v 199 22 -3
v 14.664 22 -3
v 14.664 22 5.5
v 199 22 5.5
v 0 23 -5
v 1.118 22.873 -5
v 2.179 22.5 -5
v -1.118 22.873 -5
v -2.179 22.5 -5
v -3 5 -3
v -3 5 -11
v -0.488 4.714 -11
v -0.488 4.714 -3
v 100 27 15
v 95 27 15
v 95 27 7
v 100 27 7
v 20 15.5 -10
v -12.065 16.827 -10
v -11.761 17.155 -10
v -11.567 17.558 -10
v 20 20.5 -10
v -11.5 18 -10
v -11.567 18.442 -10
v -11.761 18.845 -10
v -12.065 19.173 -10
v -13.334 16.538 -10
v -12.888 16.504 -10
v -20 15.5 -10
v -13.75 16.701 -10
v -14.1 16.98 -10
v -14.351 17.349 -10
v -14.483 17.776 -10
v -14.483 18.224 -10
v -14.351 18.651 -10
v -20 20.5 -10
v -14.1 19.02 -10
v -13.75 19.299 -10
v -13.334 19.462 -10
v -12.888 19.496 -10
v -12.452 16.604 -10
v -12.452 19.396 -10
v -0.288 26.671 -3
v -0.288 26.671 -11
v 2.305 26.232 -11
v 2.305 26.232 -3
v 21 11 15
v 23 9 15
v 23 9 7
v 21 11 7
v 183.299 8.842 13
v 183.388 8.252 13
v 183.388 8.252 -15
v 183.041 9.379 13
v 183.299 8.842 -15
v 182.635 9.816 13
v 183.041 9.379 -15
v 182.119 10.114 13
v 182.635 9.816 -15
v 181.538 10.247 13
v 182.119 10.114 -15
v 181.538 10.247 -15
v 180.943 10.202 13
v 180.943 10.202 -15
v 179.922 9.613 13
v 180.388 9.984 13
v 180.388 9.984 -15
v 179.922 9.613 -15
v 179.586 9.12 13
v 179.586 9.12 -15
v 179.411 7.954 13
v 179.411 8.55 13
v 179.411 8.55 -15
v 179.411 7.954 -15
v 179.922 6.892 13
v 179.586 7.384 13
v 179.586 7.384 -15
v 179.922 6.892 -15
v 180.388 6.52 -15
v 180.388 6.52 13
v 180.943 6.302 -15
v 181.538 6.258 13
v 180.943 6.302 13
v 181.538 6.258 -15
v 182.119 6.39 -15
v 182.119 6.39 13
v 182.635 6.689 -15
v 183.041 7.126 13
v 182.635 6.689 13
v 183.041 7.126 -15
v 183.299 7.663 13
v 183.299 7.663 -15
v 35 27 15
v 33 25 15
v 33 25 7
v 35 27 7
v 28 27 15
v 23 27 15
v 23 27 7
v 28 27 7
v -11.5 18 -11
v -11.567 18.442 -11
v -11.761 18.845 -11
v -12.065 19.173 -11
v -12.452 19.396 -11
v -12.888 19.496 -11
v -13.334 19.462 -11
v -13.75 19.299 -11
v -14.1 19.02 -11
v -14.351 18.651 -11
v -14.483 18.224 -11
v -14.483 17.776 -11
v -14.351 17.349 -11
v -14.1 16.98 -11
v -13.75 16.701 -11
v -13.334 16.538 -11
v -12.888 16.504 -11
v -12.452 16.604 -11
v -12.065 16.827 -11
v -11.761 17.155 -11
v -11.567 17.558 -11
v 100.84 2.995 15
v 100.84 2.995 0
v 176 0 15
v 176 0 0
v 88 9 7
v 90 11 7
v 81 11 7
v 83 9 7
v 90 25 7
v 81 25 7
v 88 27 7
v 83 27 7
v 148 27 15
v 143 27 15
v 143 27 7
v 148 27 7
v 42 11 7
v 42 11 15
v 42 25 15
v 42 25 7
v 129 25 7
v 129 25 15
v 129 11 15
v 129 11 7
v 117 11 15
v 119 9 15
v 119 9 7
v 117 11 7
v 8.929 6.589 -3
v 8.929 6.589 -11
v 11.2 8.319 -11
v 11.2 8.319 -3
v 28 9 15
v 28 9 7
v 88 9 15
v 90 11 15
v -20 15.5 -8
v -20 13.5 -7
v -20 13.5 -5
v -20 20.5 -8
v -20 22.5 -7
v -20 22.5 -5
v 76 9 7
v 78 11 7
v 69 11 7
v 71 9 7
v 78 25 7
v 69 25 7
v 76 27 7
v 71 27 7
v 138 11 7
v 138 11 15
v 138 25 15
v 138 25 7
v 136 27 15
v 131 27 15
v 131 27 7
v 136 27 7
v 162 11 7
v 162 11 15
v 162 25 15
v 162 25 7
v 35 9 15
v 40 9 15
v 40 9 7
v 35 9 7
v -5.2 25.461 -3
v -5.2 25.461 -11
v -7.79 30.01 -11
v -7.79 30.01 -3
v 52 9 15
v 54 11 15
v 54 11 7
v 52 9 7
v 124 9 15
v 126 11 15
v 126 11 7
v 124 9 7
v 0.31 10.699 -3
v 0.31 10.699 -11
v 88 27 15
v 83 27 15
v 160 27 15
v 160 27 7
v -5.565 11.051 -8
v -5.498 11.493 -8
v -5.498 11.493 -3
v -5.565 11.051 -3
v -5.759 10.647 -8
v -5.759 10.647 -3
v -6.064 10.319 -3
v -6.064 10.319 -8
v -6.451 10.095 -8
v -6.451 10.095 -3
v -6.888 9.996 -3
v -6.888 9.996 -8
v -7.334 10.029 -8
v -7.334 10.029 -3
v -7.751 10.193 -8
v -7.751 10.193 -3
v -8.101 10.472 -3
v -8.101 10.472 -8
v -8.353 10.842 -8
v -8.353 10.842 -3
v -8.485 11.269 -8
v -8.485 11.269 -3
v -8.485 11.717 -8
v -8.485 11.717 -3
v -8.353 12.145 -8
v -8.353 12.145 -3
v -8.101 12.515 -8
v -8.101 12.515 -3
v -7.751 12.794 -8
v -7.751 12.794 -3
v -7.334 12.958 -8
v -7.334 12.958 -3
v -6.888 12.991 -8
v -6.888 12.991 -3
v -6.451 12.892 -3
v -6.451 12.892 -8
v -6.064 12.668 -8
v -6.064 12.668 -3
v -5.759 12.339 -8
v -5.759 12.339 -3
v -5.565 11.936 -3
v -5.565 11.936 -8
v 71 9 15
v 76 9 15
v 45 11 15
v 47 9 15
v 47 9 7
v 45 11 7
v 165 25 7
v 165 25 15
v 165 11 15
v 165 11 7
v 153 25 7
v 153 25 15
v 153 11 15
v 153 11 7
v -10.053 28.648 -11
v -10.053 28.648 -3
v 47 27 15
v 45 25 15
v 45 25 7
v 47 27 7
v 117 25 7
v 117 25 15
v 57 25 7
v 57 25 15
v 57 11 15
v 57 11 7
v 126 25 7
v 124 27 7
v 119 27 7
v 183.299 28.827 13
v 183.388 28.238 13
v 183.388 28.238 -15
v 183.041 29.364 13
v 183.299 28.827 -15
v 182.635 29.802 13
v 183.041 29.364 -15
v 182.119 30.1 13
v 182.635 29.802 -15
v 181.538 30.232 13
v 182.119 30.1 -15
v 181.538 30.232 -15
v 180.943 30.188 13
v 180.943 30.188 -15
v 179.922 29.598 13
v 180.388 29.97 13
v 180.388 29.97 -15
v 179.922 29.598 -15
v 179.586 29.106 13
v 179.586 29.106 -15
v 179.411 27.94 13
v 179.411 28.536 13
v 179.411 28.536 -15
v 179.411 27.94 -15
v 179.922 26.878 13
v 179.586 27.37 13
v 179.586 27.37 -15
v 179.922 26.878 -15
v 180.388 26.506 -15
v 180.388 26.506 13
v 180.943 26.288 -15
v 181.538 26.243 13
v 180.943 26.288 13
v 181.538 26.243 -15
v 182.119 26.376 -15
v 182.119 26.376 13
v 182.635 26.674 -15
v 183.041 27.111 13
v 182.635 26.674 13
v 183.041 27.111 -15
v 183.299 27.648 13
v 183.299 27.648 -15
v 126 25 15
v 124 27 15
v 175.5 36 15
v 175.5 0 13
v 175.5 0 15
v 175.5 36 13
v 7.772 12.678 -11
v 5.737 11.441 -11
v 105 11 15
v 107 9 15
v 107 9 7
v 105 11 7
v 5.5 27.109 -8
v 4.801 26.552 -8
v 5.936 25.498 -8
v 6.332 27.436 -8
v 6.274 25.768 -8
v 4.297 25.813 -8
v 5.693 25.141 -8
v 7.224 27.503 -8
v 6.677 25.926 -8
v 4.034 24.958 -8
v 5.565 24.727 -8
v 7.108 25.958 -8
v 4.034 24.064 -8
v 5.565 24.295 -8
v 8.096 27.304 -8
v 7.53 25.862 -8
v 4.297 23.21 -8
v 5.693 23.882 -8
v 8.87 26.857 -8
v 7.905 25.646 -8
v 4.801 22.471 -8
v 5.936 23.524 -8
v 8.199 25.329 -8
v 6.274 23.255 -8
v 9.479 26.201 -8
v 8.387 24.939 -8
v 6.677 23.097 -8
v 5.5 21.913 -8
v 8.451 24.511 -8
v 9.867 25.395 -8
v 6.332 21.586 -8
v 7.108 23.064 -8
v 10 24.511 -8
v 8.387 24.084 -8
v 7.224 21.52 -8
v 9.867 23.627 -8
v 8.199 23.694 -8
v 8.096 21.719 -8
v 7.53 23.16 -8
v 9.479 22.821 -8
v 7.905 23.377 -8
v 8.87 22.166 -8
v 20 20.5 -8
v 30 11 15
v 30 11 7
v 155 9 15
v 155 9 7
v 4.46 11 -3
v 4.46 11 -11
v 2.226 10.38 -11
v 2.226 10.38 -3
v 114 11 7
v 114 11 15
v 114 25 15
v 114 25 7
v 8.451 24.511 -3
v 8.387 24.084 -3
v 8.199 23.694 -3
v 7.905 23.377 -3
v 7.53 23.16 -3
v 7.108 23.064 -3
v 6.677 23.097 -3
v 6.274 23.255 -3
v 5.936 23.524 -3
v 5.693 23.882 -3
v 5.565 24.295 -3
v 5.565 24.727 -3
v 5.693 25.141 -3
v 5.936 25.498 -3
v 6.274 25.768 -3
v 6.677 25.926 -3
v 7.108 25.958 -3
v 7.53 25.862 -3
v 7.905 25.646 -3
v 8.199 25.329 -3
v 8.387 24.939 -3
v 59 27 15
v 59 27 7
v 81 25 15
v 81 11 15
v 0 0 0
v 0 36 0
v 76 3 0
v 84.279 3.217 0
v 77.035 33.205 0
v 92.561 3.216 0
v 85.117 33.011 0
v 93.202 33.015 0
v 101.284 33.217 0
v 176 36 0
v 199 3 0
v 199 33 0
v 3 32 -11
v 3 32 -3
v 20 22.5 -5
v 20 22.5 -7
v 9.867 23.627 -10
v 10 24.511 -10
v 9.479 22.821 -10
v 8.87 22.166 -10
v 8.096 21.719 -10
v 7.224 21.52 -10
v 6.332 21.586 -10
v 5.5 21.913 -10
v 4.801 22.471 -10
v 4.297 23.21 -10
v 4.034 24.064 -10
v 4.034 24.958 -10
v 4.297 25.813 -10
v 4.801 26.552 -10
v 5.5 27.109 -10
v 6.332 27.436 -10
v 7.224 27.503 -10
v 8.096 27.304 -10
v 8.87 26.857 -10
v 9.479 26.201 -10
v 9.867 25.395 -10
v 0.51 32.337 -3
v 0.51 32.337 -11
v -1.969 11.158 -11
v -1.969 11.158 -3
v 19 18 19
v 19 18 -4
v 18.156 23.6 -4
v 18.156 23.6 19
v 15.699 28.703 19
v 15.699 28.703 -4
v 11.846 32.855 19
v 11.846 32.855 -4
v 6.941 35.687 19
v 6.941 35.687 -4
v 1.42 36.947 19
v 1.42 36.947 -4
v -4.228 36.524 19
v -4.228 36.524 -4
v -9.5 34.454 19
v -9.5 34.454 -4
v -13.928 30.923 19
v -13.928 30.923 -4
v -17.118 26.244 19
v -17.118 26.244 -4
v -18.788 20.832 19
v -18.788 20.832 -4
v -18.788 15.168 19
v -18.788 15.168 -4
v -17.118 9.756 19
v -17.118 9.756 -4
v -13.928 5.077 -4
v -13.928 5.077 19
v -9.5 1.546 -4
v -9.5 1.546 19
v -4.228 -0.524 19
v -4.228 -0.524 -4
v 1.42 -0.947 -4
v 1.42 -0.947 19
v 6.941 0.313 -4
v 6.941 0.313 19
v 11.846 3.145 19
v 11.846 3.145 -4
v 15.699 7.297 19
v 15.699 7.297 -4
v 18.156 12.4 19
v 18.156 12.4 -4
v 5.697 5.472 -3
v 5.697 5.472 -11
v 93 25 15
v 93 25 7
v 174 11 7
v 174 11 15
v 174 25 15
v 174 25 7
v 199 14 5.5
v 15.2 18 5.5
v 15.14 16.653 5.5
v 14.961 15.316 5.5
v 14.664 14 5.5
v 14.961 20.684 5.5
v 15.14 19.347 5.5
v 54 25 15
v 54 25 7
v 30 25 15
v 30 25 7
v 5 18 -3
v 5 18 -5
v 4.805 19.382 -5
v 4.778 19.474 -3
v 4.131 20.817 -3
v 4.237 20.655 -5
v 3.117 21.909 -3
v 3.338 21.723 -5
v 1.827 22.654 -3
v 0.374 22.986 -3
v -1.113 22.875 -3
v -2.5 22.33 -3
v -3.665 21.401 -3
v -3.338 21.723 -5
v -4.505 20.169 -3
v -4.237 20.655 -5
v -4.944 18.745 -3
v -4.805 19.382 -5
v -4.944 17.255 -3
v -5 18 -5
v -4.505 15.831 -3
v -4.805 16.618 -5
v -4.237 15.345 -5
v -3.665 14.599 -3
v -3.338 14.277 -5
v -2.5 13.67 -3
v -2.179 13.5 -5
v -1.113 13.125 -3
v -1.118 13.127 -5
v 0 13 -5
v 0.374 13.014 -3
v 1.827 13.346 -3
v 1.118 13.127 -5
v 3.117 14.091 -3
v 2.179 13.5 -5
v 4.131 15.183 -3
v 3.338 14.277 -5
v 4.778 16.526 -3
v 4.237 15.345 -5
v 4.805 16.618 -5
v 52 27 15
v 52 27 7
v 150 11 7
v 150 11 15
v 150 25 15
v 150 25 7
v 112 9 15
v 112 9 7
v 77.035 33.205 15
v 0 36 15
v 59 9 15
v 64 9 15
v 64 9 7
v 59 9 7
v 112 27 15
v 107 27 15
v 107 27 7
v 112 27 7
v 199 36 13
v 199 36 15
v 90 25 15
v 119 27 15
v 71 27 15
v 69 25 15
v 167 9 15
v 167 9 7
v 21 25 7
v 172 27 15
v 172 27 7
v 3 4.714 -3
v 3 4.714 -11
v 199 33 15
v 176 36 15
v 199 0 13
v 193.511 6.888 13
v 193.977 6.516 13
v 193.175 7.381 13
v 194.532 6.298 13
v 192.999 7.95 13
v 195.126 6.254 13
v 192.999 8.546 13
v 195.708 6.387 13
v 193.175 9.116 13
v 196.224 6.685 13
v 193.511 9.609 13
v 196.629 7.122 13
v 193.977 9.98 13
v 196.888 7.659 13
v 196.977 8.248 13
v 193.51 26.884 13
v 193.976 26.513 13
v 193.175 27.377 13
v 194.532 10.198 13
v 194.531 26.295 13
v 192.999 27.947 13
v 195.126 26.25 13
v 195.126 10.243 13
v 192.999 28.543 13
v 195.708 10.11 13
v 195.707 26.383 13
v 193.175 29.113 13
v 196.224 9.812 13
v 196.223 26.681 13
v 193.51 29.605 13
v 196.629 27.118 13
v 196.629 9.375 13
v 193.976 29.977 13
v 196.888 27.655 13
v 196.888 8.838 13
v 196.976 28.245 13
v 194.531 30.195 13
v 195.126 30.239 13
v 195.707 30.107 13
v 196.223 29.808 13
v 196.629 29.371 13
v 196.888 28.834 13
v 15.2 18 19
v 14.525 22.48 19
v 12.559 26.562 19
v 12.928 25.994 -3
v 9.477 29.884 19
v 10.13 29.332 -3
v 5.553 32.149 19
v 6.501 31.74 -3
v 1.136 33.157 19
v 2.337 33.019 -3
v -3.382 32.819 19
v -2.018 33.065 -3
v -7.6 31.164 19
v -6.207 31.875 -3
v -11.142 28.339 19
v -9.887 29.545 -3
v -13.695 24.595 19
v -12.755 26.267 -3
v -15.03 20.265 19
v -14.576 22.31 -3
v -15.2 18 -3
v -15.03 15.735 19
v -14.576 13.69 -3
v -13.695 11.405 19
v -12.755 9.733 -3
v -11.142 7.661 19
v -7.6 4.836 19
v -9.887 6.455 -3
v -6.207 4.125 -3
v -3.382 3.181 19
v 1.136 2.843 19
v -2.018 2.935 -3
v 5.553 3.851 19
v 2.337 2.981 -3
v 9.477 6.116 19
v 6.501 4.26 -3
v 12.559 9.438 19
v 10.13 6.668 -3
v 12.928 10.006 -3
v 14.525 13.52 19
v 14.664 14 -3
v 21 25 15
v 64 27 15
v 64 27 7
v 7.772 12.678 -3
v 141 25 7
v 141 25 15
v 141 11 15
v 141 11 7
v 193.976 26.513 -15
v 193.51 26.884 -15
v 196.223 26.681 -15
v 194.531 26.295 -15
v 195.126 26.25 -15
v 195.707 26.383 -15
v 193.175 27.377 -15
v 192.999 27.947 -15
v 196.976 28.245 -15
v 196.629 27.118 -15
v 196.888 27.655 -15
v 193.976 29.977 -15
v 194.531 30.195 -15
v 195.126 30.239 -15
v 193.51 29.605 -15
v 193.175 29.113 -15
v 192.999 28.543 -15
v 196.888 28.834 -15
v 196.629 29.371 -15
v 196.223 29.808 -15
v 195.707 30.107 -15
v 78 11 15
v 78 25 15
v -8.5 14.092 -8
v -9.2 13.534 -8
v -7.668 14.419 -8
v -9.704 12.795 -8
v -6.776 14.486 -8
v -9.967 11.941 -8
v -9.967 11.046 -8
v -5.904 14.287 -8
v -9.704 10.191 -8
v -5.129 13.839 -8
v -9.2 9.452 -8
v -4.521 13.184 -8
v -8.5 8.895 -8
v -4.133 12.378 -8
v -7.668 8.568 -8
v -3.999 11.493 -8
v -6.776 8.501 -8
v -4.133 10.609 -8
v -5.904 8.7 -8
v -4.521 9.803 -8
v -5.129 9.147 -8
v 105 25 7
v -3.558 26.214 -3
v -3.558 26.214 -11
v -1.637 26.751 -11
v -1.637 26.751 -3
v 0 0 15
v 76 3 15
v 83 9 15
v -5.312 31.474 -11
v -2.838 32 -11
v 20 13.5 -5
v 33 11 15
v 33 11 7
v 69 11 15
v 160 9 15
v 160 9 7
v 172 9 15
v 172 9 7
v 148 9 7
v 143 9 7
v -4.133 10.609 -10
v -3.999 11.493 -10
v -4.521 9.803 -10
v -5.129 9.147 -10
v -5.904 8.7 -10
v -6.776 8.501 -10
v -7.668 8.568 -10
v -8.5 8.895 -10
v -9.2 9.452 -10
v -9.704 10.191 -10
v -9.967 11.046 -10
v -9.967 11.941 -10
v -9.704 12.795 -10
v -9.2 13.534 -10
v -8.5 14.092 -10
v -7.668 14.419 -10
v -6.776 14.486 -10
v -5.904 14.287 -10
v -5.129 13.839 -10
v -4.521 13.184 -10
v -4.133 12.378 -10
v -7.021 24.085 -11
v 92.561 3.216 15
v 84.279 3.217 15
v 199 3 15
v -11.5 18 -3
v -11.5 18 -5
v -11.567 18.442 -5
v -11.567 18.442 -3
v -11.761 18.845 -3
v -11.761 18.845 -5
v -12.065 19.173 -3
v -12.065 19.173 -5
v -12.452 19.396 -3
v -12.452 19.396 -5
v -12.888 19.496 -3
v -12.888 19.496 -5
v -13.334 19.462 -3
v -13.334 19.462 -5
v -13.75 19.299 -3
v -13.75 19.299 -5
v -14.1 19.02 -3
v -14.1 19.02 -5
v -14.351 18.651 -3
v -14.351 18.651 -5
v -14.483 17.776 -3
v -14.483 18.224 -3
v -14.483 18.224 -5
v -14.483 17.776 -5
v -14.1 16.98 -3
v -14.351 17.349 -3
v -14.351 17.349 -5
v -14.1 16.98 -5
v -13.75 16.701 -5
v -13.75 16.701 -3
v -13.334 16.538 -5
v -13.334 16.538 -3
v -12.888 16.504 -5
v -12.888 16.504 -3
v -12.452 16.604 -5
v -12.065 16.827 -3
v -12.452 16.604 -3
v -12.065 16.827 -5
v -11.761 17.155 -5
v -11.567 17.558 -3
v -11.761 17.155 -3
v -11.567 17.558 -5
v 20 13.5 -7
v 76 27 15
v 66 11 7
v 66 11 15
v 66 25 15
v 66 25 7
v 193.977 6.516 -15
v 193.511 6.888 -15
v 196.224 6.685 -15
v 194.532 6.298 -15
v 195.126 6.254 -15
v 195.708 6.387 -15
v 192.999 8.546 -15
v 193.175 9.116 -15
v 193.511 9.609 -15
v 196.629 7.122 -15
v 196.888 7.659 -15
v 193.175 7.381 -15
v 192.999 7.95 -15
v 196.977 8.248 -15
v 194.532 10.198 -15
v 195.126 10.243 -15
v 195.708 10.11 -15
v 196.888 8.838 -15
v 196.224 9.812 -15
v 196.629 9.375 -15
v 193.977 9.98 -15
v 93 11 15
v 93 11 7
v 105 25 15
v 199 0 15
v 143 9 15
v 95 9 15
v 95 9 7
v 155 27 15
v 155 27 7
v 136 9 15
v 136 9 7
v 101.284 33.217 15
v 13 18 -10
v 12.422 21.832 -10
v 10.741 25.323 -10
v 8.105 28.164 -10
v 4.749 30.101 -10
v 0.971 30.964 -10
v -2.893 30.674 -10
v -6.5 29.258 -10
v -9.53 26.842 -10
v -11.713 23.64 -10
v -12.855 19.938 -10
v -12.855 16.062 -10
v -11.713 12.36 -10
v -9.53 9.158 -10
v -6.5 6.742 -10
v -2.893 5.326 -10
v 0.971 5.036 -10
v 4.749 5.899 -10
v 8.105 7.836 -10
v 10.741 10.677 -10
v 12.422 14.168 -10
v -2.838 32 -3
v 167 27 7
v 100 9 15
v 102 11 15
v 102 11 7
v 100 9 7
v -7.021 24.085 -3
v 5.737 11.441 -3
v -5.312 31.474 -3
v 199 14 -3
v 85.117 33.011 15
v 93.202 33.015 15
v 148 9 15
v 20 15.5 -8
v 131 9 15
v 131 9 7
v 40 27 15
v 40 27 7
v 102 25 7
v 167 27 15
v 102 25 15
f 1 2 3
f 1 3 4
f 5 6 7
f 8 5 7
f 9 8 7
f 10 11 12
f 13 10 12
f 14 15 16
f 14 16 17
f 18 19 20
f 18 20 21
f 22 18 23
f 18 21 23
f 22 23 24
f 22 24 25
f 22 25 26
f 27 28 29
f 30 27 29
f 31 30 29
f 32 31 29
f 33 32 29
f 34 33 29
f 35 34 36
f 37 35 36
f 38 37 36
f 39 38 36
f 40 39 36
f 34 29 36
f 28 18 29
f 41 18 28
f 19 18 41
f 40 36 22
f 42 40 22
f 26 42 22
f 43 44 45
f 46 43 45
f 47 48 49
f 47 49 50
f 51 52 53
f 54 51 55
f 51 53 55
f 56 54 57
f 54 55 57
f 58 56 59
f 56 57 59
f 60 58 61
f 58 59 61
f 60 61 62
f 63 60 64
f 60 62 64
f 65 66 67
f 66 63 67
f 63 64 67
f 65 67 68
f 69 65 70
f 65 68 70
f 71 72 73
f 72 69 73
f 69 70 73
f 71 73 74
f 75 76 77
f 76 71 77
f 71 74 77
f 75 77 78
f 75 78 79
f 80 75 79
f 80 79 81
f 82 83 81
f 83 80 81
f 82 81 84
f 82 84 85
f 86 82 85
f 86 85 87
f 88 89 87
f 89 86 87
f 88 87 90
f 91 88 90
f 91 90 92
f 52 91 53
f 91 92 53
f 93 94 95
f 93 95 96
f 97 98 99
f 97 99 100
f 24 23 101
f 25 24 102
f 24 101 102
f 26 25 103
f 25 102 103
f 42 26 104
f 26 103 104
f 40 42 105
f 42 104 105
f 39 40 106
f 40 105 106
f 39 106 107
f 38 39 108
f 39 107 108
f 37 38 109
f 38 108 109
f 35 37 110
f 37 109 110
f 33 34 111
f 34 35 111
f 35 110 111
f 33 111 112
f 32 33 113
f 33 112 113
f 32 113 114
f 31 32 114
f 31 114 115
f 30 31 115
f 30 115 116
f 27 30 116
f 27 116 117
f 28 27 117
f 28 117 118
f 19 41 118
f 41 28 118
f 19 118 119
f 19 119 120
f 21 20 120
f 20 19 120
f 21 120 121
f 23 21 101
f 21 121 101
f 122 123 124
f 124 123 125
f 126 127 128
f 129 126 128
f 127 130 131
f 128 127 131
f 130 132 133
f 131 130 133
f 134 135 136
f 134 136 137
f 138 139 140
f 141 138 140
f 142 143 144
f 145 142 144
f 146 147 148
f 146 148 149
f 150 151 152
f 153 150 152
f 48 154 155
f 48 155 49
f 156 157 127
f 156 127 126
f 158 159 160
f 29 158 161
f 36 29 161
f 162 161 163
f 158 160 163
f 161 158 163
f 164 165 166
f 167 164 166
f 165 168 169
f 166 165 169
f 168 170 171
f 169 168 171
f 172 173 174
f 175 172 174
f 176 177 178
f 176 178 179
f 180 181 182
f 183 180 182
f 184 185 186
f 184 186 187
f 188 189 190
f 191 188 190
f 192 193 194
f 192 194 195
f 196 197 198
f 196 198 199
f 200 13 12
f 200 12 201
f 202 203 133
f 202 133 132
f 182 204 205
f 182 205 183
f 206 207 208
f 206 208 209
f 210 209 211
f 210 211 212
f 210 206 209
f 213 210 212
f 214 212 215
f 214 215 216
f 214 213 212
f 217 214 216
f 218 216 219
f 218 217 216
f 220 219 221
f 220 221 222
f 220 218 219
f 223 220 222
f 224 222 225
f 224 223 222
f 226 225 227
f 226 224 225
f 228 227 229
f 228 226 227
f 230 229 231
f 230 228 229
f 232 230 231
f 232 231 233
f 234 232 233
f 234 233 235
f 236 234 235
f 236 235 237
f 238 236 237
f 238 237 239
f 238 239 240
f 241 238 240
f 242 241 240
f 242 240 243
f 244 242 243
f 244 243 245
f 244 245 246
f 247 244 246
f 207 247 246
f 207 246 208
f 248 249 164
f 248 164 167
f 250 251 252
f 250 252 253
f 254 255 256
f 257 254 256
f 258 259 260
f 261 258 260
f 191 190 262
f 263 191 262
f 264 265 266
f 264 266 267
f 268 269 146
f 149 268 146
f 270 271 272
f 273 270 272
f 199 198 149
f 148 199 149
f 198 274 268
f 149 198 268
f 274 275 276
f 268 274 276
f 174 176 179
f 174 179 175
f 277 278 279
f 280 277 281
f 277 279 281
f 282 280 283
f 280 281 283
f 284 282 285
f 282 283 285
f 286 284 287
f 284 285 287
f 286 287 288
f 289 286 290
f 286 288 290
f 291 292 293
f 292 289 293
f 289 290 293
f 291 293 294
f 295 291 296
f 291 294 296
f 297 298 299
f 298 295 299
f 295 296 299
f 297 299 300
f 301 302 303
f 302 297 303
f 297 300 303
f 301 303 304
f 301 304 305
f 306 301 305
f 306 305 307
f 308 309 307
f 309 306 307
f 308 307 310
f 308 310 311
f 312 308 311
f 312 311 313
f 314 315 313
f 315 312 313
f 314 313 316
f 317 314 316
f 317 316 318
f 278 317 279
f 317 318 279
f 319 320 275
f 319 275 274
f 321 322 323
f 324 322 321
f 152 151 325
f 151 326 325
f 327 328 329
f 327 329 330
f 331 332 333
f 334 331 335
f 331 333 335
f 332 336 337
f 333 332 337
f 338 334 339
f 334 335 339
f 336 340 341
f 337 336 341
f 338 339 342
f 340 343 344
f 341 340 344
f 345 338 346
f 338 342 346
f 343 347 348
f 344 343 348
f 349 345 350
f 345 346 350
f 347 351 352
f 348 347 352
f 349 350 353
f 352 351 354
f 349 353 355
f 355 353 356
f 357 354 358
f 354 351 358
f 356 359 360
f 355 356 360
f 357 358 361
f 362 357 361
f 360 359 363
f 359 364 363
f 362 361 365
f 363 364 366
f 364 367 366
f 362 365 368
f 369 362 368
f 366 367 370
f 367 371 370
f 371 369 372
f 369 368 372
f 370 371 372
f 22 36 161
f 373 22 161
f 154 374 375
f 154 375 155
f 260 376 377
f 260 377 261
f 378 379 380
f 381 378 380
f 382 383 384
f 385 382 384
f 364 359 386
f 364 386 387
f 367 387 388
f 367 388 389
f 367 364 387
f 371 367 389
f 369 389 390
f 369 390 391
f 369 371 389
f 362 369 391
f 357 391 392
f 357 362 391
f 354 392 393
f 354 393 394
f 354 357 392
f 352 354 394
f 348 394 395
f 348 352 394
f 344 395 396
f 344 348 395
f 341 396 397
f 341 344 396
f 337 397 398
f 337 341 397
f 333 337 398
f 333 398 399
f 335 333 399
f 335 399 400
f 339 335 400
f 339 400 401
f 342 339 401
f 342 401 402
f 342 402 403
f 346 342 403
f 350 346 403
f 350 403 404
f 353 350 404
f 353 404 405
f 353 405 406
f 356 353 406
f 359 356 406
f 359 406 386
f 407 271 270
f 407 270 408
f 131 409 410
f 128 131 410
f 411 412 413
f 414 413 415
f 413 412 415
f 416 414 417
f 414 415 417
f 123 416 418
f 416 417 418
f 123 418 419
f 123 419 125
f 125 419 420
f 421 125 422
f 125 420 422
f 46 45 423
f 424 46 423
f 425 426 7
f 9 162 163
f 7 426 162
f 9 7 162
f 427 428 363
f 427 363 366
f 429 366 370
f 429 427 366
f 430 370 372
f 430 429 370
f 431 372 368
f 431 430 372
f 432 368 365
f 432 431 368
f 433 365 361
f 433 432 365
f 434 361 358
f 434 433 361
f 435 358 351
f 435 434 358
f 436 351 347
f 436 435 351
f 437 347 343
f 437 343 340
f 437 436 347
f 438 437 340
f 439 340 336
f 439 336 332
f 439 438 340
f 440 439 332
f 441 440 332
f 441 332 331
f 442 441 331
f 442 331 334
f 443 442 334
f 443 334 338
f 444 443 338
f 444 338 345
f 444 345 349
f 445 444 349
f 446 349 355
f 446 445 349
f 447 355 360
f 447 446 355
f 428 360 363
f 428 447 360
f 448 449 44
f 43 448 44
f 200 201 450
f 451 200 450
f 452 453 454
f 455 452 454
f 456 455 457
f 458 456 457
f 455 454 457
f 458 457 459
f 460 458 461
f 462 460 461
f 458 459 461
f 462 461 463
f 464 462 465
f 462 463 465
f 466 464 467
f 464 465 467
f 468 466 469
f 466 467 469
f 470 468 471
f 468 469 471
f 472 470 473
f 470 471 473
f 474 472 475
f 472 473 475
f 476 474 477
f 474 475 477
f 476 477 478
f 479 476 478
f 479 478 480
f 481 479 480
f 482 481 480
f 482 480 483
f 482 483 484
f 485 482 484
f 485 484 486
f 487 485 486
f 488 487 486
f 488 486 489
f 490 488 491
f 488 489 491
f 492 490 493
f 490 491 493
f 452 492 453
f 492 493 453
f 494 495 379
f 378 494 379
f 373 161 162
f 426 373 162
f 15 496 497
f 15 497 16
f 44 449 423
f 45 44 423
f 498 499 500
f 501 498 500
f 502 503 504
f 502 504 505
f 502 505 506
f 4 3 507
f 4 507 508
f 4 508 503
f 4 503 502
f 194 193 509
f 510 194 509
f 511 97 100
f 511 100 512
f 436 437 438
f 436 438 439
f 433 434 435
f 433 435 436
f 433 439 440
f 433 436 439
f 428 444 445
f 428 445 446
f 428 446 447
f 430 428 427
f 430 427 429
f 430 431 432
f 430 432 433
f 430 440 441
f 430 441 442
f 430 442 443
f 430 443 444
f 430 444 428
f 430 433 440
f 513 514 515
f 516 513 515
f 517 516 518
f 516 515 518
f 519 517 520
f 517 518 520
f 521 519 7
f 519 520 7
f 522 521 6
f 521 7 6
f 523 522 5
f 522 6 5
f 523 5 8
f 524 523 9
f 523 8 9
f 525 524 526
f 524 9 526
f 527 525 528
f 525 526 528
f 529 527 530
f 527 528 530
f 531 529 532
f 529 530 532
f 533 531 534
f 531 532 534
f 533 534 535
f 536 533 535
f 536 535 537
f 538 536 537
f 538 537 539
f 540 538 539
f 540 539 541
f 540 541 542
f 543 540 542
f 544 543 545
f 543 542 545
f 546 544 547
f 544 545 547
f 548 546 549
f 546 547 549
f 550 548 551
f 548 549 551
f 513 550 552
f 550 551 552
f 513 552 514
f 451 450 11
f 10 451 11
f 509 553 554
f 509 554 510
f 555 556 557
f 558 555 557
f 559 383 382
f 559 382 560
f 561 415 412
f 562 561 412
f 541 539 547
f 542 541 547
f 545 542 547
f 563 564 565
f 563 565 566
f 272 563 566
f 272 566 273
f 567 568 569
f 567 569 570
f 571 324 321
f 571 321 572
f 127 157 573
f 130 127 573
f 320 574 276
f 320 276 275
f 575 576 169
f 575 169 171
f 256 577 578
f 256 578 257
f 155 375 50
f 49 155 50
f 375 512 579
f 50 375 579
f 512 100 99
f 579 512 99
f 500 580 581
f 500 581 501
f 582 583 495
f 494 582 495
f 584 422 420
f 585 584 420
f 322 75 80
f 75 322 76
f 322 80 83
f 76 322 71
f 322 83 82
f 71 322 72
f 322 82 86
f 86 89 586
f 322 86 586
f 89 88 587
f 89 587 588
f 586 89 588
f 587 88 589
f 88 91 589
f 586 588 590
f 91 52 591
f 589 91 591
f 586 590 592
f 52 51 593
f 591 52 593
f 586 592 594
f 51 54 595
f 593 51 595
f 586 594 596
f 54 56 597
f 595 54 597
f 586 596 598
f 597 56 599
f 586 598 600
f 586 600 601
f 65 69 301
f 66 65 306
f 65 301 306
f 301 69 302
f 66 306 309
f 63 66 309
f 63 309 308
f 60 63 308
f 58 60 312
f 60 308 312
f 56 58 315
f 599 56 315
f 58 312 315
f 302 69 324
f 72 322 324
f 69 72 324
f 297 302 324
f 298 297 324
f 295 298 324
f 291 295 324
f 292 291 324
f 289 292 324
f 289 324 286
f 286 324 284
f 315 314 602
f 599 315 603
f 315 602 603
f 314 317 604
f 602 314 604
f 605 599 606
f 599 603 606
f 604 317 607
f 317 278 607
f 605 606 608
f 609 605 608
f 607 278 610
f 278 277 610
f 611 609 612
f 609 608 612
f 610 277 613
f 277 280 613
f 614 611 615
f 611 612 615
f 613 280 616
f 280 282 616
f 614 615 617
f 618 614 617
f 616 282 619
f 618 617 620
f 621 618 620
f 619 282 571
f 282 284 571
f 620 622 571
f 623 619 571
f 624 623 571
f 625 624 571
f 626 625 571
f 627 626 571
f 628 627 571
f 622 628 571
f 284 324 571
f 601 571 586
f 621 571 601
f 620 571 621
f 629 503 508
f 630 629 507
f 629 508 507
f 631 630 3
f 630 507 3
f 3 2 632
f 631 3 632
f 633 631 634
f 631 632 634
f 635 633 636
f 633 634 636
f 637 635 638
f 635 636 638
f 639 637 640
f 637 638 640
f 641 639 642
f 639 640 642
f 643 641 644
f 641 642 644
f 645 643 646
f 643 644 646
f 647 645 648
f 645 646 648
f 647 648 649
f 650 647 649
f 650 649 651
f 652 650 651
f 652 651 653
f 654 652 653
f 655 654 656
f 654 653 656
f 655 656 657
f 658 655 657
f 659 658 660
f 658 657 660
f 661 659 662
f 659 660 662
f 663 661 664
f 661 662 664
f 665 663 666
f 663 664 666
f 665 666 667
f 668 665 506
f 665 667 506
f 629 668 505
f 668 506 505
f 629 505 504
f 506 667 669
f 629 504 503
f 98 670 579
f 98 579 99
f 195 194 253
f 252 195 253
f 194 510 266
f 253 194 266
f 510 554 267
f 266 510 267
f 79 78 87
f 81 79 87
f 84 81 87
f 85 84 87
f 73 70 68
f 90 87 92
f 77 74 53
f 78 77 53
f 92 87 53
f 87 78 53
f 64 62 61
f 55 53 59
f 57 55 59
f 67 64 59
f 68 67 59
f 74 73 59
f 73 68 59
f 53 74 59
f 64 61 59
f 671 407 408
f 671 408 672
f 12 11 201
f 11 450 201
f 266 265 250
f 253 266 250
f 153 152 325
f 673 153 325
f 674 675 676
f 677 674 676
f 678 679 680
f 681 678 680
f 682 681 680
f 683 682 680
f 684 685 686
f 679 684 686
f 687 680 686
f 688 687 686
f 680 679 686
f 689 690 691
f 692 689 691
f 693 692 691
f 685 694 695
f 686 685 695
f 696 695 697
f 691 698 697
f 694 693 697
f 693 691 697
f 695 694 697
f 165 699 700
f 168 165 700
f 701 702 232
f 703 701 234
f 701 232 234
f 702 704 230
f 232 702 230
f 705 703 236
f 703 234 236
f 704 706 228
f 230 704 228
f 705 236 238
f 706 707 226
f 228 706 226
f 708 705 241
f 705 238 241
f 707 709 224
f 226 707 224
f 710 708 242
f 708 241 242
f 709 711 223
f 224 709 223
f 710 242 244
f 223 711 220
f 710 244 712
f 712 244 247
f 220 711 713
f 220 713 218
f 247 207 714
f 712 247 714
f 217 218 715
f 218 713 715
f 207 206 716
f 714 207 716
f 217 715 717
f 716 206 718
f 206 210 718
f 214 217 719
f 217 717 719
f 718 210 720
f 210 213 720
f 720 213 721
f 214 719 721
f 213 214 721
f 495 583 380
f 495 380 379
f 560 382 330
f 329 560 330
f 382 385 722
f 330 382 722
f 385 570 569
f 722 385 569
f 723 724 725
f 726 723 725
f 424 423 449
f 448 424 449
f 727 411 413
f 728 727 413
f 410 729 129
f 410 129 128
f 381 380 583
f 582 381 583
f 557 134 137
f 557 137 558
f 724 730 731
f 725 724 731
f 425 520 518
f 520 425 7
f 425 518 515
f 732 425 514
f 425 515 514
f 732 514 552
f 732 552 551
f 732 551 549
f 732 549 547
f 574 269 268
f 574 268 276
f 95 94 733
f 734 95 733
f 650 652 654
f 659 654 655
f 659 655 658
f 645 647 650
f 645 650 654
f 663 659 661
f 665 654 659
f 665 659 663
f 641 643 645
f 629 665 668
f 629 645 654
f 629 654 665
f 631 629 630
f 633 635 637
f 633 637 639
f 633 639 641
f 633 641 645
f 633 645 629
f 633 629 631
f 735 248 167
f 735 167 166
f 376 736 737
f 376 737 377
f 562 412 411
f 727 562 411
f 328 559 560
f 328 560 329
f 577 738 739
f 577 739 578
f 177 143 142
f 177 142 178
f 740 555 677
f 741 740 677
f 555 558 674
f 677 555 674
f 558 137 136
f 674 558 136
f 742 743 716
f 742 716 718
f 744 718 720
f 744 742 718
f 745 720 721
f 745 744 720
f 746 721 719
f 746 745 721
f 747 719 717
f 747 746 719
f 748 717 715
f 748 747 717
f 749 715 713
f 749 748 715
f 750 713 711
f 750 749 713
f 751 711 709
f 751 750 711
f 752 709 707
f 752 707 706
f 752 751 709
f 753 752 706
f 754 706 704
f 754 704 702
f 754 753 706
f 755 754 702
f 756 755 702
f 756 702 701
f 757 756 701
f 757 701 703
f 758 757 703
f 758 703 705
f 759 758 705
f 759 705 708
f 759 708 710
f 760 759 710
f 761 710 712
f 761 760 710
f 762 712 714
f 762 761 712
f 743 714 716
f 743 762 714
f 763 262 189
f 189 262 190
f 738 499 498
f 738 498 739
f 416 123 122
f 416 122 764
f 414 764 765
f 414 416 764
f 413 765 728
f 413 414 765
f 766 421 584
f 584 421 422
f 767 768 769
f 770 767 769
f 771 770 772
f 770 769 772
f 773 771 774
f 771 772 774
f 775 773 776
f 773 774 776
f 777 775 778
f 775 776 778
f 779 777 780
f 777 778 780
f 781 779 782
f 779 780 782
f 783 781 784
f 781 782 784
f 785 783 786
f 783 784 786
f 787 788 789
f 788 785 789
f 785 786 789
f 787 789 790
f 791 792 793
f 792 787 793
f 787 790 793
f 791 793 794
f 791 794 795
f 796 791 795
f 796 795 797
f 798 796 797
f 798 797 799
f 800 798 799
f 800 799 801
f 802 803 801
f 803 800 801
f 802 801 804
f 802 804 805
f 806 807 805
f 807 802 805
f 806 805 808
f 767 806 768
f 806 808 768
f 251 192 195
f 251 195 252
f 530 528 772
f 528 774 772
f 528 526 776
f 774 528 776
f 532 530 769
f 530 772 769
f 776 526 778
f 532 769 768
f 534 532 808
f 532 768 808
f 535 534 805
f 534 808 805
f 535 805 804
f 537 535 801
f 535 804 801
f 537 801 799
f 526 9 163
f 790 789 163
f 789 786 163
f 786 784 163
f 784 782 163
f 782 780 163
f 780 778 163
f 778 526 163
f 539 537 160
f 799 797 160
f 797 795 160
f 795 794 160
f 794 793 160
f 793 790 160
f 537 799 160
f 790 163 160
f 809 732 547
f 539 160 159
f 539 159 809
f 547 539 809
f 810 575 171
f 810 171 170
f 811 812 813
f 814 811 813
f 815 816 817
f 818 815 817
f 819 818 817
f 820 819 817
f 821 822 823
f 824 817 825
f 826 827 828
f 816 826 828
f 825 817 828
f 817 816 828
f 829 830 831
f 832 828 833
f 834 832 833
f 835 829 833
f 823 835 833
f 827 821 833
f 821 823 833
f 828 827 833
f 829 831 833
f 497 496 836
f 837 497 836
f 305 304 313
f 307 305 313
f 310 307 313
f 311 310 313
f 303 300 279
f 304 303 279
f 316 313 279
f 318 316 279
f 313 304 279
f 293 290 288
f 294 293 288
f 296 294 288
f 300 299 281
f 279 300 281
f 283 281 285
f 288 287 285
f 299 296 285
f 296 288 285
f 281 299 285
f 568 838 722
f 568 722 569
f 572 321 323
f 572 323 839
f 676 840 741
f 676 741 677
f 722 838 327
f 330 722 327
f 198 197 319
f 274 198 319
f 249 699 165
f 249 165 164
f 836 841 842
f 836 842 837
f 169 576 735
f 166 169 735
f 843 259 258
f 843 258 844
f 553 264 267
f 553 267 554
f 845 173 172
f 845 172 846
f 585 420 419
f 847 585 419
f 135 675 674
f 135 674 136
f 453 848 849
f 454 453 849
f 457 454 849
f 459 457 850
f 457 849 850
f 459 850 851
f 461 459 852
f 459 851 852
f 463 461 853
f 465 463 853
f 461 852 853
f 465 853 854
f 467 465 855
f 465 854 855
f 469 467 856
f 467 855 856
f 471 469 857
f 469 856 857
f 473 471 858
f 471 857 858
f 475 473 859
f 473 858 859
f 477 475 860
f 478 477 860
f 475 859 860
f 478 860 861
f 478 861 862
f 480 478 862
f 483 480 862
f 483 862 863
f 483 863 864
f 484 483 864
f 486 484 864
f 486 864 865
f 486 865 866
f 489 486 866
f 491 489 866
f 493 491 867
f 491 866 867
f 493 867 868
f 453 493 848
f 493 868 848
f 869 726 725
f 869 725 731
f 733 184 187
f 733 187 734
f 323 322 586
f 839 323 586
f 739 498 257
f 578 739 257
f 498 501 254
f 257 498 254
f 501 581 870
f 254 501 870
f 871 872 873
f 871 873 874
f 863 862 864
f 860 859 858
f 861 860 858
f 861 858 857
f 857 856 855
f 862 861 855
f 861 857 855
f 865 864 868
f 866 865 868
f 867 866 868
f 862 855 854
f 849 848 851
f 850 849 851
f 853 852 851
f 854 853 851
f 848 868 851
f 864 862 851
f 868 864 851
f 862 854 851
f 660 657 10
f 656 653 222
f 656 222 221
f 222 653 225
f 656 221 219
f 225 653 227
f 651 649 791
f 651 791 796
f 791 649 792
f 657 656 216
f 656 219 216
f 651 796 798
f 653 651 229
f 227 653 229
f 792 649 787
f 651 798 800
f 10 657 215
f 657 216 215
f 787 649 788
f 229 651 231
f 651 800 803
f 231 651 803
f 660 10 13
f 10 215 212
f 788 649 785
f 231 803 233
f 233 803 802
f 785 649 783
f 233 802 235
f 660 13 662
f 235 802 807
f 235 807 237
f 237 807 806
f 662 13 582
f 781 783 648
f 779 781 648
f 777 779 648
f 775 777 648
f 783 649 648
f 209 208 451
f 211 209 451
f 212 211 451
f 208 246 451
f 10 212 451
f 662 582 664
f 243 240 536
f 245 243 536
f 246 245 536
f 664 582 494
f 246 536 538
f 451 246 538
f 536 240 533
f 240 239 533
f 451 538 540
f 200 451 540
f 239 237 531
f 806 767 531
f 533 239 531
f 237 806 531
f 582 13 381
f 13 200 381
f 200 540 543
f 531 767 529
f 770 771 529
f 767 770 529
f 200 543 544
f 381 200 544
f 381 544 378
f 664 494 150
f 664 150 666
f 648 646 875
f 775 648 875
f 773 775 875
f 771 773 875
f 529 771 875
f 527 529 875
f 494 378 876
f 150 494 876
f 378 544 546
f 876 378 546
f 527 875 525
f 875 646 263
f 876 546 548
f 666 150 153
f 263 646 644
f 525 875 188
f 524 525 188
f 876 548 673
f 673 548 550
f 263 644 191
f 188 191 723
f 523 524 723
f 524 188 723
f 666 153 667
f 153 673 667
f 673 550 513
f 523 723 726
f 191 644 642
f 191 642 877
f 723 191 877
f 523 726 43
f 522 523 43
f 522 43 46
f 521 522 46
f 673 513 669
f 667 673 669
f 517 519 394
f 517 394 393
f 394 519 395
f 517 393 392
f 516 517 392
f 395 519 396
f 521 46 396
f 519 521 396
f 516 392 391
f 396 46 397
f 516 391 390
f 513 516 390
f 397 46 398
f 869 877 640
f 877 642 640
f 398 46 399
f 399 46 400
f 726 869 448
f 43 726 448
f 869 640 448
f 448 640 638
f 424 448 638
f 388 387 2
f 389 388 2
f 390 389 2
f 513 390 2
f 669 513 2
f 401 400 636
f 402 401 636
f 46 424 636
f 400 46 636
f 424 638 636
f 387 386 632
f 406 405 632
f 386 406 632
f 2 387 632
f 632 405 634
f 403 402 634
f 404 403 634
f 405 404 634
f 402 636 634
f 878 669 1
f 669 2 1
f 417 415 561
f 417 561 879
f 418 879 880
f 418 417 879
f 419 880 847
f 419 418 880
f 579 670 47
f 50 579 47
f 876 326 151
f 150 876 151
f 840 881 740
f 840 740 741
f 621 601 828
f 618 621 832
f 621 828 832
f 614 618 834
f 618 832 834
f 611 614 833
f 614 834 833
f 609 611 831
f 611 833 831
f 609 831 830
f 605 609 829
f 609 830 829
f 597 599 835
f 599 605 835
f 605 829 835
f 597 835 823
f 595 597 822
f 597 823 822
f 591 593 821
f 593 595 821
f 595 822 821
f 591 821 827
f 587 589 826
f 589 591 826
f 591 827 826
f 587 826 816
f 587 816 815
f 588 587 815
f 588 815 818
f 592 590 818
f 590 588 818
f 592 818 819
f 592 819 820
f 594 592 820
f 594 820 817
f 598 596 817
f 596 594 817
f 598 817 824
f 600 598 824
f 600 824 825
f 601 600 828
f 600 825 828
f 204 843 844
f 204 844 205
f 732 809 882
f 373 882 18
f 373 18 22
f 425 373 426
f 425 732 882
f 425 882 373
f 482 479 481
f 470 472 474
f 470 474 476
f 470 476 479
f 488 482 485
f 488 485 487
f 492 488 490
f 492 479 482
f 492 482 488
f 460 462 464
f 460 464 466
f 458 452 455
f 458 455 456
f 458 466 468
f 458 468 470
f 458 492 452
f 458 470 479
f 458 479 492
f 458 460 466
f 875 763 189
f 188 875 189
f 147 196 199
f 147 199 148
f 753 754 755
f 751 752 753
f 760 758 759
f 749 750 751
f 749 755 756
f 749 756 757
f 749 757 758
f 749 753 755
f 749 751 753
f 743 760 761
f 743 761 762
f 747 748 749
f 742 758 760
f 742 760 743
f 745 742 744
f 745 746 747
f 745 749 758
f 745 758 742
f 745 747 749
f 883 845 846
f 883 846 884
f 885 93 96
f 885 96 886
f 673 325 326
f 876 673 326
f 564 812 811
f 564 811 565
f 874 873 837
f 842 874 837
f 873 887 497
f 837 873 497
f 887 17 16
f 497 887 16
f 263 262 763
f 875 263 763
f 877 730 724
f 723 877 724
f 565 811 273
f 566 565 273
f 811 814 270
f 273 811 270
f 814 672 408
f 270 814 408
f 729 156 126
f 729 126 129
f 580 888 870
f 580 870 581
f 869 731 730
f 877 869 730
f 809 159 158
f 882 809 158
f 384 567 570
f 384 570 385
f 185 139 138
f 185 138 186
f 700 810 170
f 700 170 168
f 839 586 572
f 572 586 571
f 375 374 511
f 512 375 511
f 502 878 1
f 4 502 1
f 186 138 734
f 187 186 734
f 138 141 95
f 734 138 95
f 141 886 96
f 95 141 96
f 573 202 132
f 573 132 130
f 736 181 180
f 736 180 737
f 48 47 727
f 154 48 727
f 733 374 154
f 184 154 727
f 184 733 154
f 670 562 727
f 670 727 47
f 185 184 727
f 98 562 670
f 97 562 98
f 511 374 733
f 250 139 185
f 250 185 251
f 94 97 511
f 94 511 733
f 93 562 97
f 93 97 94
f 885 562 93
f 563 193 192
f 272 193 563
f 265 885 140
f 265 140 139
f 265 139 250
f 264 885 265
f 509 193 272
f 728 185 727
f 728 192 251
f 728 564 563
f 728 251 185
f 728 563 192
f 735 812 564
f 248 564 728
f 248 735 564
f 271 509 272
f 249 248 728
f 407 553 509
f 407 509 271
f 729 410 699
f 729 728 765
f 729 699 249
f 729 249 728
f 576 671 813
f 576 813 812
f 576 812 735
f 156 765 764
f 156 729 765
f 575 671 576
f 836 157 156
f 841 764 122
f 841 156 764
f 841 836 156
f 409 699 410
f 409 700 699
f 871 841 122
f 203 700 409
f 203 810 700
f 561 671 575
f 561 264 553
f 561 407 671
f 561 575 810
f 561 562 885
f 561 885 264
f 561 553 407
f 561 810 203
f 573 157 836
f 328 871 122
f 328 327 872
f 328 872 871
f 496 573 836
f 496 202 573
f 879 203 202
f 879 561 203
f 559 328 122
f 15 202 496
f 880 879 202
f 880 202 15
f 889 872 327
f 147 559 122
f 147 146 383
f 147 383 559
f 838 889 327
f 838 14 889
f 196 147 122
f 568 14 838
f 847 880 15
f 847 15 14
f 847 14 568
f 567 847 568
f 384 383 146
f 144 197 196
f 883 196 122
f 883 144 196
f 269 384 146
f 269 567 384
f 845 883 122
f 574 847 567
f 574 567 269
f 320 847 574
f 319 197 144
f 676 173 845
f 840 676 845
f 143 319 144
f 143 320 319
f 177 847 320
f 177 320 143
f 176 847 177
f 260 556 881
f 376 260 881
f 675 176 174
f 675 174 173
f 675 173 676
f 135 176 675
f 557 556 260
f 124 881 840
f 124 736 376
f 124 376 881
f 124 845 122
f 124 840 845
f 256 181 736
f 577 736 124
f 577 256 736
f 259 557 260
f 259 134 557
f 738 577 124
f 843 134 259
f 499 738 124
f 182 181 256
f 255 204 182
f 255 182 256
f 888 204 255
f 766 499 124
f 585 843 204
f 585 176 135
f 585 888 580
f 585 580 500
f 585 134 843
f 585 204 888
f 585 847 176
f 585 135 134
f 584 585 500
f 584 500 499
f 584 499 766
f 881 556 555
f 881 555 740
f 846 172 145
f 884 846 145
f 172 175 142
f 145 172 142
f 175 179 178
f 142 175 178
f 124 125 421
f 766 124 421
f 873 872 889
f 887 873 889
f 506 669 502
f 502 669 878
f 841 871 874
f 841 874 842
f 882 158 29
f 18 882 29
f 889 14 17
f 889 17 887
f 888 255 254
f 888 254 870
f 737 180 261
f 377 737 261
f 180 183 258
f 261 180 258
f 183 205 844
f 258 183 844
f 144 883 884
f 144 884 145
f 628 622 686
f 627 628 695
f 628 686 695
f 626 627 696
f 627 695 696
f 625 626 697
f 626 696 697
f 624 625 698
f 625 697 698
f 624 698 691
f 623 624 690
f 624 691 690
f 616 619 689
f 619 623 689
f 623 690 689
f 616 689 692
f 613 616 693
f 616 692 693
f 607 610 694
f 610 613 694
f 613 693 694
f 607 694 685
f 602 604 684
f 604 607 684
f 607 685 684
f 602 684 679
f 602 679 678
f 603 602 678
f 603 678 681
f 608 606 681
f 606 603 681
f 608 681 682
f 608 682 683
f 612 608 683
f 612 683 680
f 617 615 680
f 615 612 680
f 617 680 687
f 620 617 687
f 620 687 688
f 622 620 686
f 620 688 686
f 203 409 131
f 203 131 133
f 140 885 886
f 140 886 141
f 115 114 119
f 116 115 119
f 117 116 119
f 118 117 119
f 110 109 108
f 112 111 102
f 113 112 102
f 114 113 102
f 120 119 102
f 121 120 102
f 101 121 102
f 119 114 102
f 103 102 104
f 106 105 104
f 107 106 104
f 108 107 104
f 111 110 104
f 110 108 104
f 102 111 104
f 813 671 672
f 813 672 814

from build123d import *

# Parameters (mm, degrees)
CYLINDER_R          = 19
CYLINDER_DEPTH      = 29
CHAMFER_SIZE        = 6
CYLINDER001_R       = 15.2
CYLINDER001_DEPTH   = 22
BOX001_W            = 23.5
BOX001_H            = 36
BOX001_DEPTH        = 2
CYLINDER002_R       = 5
CYLINDER002_DEPTH   = 10
PAD003_DEPTH        = 40
BOX002_W            = 199
BOX002_H            = 8
BOX002_DEPTH        = 8.5
SKETCH002_R         = 3.000774
SKETCH002_R_2       = 3
PAD_DEPTH           = 2
PAD002_DEPTH        = 10
SKETCH001_R         = 1.502004
SKETCH001_R_2       = 1.451029
PAD001_DEPTH        = 10
SKETCH005_R         = 2
PAD005_DEPTH        = 30
CYLINDER003_R       = 1.5
CYLINDER003_DEPTH   = 10
PAD004_DEPTH        = 15
POCKET_DEPTH        = 8
LINEARPATTERN_COUNT = 13
LINEARPATTERN_PITCH = 12


with BuildPart() as chamfer_body:
    # Cylinder → Cylinder (new body)
    with BuildSketch(Plane(origin=(0, 18, -10), x_dir=(1, 0, 0), z_dir=(0, 0, 1))):
        Circle(CYLINDER_R)
    extrude(amount=CYLINDER_DEPTH)

    # Chamfer
    chamfer_edges = [chamfer_body.edges().sort_by_distance(p)[0] for p in [
        (-19, 18, -10),
    ]]
    chamfer(chamfer_edges, length=CHAMFER_SIZE)


with BuildPart() as cylinder001:
    # Cylinder001 → Cylinder001 (new body)
    with BuildSketch(Plane(origin=(0, 18, -3), x_dir=(1, 0, 0), z_dir=(0, 0, 1))):
        Circle(CYLINDER001_R)
    extrude(amount=CYLINDER001_DEPTH)


with BuildPart() as cube001:
    # Box001 → Box001 (new body)
    with BuildSketch(Plane(origin=(175.5, 0, 13), x_dir=(1, 0, 0), z_dir=(0, 0, 1))):
        with Locations((11.75, 18)):
            Rectangle(BOX001_W, BOX001_H)
    extrude(amount=BOX001_DEPTH)


with BuildPart() as cylinder002:
    # Cylinder002 → Cylinder002 (new body)
    with BuildSketch(Plane(origin=(0, 18, -5), x_dir=(1, 0, 0), z_dir=(0, 0, 1))):
        Circle(CYLINDER002_R)
    extrude(amount=CYLINDER002_DEPTH)


with BuildPart() as pad003:
    # Sketch → Pad003 (new body)
    with BuildSketch(Plane(origin=(-20, 29.5, -6), x_dir=(0, -1, 0), z_dir=(-1, 0, 0))):
        Polygon((7, 1), (16, 1), (16, -1), (14, -2), (14, -4), (9, -4), (9, -2), (7, -1), align=None)
    extrude(amount=-PAD003_DEPTH)


with BuildPart() as cube002:
    # Box002 → Box002 (new body)
    with BuildSketch(Plane(origin=(0, 14, -3), x_dir=(1, 0, 0), z_dir=(0, 0, 1))):
        with Locations((99.5, 4)):
            Rectangle(BOX002_W, BOX002_H)
    extrude(amount=BOX002_DEPTH)


with BuildPart() as pad:
    # Sketch002 → Pad (new body)
    with BuildSketch(Plane(origin=(0, 0, -10), x_dir=(1, 0, 0), z_dir=(0, 0, -1))):
        with Locations((-7, -11.493315)):
            Circle(SKETCH002_R)
        with Locations((7, -24.511189)):
            Circle(SKETCH002_R_2)
    extrude(amount=-PAD_DEPTH)


with BuildPart() as pad002:
    # Sketch003 → Pad002 (new body)
    with BuildSketch(Plane.XY.offset(-11)):
        Polygon((-3, 5), (-0.487519, 4.71382), (0.310489, 10.698878), (-1.969301, 11.158109), align=None)
        Polygon((3, 4.71382), (5.697039, 5.471929), (4.460128, 11), (2.225708, 10.379674), align=None)
        Polygon((8.928973, 6.58914), (11.199503, 8.319204), (7.771865, 12.678307), (5.736944, 11.441395), align=None)
        Polygon((3, 32), (0.509665, 32.336639), (-0.288343, 26.670786), (2.305181, 26.231882), align=None)
        Polygon((-2.837909, 32), (-5.312378, 31.473824), (-3.557683, 26.214495), (-1.636838, 26.750586), align=None)
        Polygon((-7.789613, 30.009914), (-10.053051, 28.648418), (-7.020621, 24.084783), (-5.1995, 25.461271), align=None)
    extrude(amount=PAD002_DEPTH)


with BuildPart() as pad001:
    # Sketch001 → Pad001 (new body)
    with BuildSketch(Plane(origin=(0, 0, -10), x_dir=(1, 0, 0), z_dir=(0, 0, -1))):
        with Locations((-7, -11.493349)):
            Circle(SKETCH001_R)
        with Locations((7, -24.511223)):
            Circle(SKETCH001_R_2)
    extrude(amount=-PAD001_DEPTH)


with BuildPart() as pad005:
    # Sketch005 → Pad005 (new body)
    with BuildSketch(Plane(origin=(-6.25, 4, -15), x_dir=(1, 0, 0), z_dir=(0, 0, 1))):
        with Locations((201.226852, 4.248305)):
            Circle(SKETCH005_R)
        with Locations((201.226486, 24.244774)):
            Circle(SKETCH005_R)
        with Locations((187.638336, 4.252245)):
            Circle(SKETCH005_R)
        with Locations((187.63829, 24.237858)):
            Circle(SKETCH005_R)
    extrude(amount=PAD005_DEPTH)


with BuildPart() as fusion:
    # Cylinder003 → Cylinder003 (new body)
    with BuildSketch(Plane(origin=(-13, 18, -11), x_dir=(1, 0, 0), z_dir=(0, 0, 1))):
        Circle(CYLINDER003_R)
    extrude(amount=CYLINDER003_DEPTH)

    # Fusion: union Cylinder001, Cube001, Cylinder002, Pad003, Cube002, Pad, Pad002, Pad001, Pad005
    add(cylinder001.part)
    add(cube001.part)
    add(cylinder002.part)
    add(pad003.part)
    add(cube002.part)
    add(pad.part)
    add(pad002.part)
    add(pad001.part)
    add(pad005.part)


with BuildPart() as linearpattern:
    # Sketch004 → Pad004 (new body)
    with BuildSketch(Plane.XY):
        with BuildLine():
            Line((0, 0), (76, 3))
            ThreePointArc((100.839849, 2.995305), (88.419971, 3.243861), (76, 3))
            Line((100.839849, 2.995305), (176, 0))
            Line((176, 0), (199, 3))
            Line((199, 3), (199, 33))
            Line((199, 33), (176, 36))
            Line((176, 36), (101.284065, 33.216912))
            ThreePointArc((77.035092, 33.205178), (89.159687, 32.988246), (101.284065, 33.216912))
            Line((77.035092, 33.205178), (0, 36))
            Line((0, 36), (0, 0))
        make_face()
    extrude(amount=PAD004_DEPTH)

    # Sketch006 → Pocket (cut)
    with BuildSketch(Plane.XY.offset(15)):
        Polygon((21, 18), (21, 25), (23, 27), (28, 27), (30, 25), (30, 18), (30, 11), (28, 9), (23, 9), (21, 11), align=None)
    pocket = extrude(amount=-POCKET_DEPTH, mode=Mode.SUBTRACT)

    # LinearPattern: Pocket ×13
    with Locations(*[(i * LINEARPATTERN_PITCH, 0, 0) for i in range(1, LINEARPATTERN_COUNT)]):
        add(pocket, mode=Mode.SUBTRACT)


solid = Compound([chamfer_body.part, fusion.part, linearpattern.part])
